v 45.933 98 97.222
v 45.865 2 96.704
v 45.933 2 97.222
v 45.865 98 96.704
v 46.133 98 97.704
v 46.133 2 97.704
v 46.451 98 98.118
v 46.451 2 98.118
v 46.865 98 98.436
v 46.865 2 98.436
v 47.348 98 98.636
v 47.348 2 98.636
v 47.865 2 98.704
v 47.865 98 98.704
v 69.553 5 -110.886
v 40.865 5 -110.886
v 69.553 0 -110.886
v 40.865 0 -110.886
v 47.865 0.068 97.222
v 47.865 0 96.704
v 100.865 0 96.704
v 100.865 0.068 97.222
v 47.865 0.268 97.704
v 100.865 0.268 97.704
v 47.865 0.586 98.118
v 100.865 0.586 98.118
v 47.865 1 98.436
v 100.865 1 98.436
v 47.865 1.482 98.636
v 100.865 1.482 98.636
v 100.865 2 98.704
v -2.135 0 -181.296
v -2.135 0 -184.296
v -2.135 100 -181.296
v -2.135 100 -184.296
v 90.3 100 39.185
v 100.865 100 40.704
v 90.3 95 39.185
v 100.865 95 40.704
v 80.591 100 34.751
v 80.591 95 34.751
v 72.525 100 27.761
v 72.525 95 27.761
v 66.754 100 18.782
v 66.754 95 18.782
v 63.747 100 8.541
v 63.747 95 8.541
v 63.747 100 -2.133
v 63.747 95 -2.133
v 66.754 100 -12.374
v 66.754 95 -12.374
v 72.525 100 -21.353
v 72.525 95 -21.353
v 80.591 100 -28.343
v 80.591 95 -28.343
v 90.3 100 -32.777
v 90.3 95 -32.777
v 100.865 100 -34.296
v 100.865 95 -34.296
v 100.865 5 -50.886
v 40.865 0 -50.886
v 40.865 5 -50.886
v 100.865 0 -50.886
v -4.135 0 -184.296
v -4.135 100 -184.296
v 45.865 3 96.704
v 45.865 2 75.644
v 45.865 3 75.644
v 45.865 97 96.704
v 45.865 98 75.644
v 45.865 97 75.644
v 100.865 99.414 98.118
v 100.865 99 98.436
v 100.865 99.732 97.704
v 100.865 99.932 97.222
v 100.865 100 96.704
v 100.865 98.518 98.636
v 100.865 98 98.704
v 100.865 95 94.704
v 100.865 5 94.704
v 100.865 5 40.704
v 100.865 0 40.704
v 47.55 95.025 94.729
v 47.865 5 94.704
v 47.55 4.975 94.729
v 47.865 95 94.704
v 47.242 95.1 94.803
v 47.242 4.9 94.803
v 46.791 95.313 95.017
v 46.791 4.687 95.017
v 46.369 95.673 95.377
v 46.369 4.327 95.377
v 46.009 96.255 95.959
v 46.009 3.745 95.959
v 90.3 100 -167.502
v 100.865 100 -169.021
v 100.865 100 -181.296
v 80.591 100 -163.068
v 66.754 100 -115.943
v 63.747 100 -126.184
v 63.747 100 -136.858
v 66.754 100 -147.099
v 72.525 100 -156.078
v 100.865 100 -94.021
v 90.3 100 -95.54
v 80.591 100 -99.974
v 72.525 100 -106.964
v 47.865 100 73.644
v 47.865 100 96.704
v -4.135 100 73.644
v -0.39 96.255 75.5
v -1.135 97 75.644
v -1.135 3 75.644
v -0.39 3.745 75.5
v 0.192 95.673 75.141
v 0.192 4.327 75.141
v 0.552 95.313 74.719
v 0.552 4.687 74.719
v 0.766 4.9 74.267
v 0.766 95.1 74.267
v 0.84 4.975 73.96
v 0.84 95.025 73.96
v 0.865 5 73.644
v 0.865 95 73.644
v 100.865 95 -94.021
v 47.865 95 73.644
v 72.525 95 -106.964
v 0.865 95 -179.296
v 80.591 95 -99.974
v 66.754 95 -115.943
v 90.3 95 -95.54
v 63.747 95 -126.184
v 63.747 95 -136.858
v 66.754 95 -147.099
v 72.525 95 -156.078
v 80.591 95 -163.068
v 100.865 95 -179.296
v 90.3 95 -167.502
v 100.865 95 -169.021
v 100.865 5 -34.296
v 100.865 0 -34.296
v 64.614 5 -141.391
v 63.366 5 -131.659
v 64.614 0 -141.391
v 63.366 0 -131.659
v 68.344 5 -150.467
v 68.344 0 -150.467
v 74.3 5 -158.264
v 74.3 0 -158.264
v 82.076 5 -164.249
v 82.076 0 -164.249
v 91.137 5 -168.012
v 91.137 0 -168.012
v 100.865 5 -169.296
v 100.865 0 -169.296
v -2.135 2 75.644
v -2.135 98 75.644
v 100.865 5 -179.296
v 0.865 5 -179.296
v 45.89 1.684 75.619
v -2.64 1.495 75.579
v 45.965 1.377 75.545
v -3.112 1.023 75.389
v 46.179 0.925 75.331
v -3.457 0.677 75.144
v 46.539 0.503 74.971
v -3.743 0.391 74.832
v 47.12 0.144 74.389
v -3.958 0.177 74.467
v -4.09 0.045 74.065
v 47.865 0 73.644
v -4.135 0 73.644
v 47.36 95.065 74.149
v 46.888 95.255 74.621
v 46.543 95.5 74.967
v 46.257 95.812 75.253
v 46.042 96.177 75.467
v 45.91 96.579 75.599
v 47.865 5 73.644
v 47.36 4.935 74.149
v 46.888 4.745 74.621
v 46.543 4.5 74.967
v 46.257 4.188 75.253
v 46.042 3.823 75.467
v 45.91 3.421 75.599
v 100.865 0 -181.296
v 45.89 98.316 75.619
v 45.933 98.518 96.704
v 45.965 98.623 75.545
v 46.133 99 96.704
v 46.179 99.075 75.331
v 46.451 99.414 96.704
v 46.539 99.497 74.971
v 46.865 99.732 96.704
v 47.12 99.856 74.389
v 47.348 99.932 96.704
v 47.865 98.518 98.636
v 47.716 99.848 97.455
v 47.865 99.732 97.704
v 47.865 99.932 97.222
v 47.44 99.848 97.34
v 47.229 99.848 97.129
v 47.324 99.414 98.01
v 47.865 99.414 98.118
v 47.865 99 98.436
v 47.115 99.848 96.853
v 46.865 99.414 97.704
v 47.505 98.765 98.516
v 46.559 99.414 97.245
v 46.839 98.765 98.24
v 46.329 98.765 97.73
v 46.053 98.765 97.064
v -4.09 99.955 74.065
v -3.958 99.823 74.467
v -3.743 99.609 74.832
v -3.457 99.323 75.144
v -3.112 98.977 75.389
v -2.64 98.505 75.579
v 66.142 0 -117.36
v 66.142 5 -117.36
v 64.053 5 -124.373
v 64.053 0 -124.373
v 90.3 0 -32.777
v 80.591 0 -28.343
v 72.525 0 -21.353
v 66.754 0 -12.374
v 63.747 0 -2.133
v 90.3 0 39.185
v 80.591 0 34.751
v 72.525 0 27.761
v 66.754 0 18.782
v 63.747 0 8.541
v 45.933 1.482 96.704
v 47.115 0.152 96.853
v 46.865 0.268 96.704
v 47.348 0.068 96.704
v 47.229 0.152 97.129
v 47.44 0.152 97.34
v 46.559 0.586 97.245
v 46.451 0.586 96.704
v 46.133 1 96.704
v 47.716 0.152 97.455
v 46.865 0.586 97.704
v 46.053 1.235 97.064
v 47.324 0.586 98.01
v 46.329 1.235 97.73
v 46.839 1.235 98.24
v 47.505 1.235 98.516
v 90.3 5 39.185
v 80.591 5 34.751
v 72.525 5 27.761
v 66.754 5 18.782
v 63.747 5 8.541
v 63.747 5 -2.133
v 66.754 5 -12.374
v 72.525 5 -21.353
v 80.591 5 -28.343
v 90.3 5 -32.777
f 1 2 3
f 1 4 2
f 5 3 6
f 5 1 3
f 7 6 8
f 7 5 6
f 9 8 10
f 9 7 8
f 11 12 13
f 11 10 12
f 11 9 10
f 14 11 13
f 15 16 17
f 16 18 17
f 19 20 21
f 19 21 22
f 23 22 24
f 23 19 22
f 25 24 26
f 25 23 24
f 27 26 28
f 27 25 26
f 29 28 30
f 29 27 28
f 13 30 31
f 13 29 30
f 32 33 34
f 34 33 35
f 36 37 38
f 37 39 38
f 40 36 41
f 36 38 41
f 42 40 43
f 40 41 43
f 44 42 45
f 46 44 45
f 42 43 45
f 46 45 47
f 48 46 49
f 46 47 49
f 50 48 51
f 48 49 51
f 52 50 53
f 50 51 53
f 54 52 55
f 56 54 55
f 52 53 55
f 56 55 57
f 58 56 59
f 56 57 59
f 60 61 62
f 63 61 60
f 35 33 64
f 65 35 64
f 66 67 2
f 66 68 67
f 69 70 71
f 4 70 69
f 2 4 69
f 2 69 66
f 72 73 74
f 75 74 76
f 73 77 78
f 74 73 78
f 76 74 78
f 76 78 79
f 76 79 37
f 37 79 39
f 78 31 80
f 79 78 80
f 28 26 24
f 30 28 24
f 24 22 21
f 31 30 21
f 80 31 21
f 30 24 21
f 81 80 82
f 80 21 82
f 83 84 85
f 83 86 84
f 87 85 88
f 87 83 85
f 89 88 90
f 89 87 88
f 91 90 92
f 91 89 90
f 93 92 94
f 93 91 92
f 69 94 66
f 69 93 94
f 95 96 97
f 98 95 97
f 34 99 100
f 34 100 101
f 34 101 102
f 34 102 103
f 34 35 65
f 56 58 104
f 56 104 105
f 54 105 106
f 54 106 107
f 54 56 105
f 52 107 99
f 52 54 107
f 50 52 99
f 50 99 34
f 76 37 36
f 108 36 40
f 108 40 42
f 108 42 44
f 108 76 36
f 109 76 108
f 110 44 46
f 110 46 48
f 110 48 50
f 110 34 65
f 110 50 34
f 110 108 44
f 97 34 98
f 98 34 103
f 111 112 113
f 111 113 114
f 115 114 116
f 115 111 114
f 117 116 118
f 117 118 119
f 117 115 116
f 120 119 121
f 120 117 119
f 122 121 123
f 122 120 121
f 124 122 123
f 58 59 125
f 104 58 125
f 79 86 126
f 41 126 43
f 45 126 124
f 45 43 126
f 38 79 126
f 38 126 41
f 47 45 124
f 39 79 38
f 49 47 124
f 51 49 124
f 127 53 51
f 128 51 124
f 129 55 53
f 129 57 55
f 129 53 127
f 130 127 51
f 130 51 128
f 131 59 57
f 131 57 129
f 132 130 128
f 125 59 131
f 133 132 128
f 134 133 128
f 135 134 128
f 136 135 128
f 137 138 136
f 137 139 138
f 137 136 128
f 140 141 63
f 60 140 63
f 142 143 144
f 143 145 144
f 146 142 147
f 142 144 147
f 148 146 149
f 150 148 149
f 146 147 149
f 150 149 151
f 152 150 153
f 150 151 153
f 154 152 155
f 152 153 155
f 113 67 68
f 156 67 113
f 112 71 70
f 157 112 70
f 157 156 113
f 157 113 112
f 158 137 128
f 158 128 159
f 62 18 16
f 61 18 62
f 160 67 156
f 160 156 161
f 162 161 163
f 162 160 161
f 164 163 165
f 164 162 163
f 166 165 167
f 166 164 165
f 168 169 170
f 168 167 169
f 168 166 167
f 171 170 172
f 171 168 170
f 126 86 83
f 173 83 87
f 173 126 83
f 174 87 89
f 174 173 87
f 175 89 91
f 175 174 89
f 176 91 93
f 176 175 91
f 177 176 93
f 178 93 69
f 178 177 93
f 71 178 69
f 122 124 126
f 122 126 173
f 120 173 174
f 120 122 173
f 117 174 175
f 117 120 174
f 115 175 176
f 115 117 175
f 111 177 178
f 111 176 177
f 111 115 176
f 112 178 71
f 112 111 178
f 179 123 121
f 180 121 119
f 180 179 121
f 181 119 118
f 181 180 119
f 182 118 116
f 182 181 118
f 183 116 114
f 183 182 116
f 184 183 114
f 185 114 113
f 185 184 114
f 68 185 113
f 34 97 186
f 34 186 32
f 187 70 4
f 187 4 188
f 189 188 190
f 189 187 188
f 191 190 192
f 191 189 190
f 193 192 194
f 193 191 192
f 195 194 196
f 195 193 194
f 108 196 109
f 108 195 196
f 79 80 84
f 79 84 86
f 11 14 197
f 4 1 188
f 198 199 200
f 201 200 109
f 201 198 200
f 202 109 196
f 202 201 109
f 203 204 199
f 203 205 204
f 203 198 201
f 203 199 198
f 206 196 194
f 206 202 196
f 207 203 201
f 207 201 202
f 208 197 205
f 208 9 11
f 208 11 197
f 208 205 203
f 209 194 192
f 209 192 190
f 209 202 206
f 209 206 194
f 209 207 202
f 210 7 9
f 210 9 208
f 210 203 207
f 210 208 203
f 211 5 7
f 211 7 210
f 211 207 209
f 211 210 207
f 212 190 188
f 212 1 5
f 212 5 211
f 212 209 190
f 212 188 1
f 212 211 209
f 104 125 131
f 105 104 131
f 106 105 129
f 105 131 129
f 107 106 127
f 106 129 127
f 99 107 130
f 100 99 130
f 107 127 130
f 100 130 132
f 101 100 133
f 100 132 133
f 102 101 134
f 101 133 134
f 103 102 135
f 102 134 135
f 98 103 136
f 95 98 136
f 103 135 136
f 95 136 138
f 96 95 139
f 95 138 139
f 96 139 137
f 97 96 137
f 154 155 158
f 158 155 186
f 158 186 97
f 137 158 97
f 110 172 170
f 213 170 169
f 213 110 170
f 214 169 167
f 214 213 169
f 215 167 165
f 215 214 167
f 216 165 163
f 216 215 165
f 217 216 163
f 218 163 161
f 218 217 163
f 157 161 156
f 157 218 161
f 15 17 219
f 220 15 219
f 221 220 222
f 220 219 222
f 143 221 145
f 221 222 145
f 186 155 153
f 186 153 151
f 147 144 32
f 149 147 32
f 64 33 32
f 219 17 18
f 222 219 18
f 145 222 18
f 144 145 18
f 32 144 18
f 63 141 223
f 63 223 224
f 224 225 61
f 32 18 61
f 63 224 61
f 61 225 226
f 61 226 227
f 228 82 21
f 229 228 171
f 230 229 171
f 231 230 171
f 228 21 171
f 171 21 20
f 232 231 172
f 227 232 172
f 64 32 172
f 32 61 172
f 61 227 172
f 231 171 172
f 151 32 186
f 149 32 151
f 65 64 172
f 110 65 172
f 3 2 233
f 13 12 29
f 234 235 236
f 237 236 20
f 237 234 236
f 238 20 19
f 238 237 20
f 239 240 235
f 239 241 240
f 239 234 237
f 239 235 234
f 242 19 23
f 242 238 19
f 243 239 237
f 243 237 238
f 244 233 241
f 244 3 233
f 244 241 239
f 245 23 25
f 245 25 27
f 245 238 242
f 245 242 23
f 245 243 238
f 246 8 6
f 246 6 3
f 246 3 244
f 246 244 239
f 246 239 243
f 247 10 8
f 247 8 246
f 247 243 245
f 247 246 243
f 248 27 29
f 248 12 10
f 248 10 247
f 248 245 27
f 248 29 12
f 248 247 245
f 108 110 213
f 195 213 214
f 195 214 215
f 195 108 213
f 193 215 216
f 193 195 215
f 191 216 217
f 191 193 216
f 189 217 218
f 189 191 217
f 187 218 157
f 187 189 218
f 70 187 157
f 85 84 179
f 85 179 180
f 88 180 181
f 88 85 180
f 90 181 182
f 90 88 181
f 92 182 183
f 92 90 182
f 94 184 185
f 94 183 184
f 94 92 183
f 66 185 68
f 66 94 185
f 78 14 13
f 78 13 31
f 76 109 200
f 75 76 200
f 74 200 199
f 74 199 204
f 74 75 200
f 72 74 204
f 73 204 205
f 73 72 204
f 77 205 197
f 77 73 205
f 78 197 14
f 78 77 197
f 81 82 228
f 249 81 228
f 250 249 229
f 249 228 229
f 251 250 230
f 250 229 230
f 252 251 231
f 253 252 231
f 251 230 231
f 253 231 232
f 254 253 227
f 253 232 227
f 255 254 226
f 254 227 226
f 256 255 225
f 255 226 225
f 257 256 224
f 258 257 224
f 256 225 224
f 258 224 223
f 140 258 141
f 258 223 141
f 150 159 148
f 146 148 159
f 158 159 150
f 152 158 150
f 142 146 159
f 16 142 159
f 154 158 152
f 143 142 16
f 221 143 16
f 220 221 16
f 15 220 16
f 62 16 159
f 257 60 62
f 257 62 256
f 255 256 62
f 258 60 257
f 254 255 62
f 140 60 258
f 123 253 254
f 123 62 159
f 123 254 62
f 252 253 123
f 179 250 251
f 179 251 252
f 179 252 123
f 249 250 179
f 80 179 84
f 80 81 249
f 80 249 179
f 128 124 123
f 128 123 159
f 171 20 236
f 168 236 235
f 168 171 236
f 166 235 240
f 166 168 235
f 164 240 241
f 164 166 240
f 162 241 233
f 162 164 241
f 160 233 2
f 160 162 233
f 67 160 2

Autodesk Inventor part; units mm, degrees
ref_plane "YZ Plane" through (0, 0, 0) normal (1, 0, 0) x (0, 1, 0)
ref_plane "XZ Plane" through (0, 0, 0) normal (0, 1, 0) x (-1, 0, 0)
ref_plane "XY Plane" through (0, 0, 0) normal (0, 0, 1) x (1, 0, 0)
sketch "스케치1" plane through (0, 0, 0) normal (0, 1, 0) x (-1, 0, 0)
  line L0 (4.1347, 105.7038) -> (-100.8653, 105.7038)
  line L1 (-100.8653, 105.7038) -> (-100.8653, -184.2962)
  line L2 (-100.8653, -184.2962) -> (4.1347, -184.2962)
  line L3 (4.1347, -184.2962) -> (4.1347, 105.7038)
  point P0 (0, 0)
  dimension "d0" = 105
  dimension "d1" = 290
sketch "스케치2" plane through (0, 0, 0) normal (0, 1, 0) x (-1, 0, 0)
  point P0 (0, 0)
sketch "스케치3" plane through (0, 0, 0) normal (0, 1, 0) x (-1, 0, 0)
  point P0 (0, 0)
sketch "스케치4" plane through (0, 0, 0) normal (0, 1, 0) x (-1, 0, 0)
  point P0 (0, 0)
extrude "돌출1" add sketch "스케치1" along normal blind 100
sketch "스케치5" plane through (100.8653, 0, 105.7038) normal (1, 0, 0) x (0, 0, -1)
  line L0 (0, 0) -> (290, 0) projected
  line L1 (290, 0) -> (285, 0)
  line L2 (285, 0) -> (285, 5)
  line L3 (285, 5) -> (290, 5)
  line L4 (290, 5) -> (290, 0)
  line L5 (290, 0) -> (290, 100) projected
  line L6 (290, 100) -> (285, 100)
  line L7 (285, 100) -> (285, 95)
  line L8 (285, 95) -> (290, 95)
  line L9 (290, 95) -> (290, 100)
  line L10 (285, 5) -> (35, 5)
  line L11 (35, 5) -> (35, 95)
  line L12 (35, 95) -> (285, 95)
  line L13 (285, 95) -> (285, 5)
  point P0 (105.7038, 0)
  dimension "d4" = 5
  dimension "d5" = 5
  dimension "d6" = 5
  dimension "d7" = 5
  dimension "d8" = 250
  dimension "d9" = 90
extrude "돌출2" cut sketch "스케치5" against normal blind 100 contours L10 L11 L12 L13
sketch "스케치6" plane through (100.8653, 0, 105.7038) normal (1, 0, 0) x (0, 0, -1)
  point P0 (105.7038, 0)
sketch "스케치7" plane through (100.8653, 0, 105.7038) normal (1, 0, 0) x (0, 0, -1)
  line L0 (285, 5) -> (35, 5) projected
  line L1 (35, 5) -> (11, 5)
  line L2 (11, 5) -> (11, 95)
  line L3 (11, 95) -> (35, 95)
  line L4 (35, 95) -> (35, 5)
  point P0 (105.7038, 0)
  dimension "d12" = 24
extrude "돌출3" cut sketch "스케치7" against normal blind 100
sketch "스케치8" plane through (-4.1347, 0, 105.7038) normal (0, 0, 1) x (1, 0, 0)
  circle A0 centre (22.6105, 17.0226) radius 10.2543
  point P0 (4.1347, 0)
sketch "스케치11" plane through (-4.1347, 0, -184.2962) normal (-1, 0, 0) x (0, 0, 1)
  point P0 (184.2962, 0)
sketch "스케치9" plane through (-4.1347, 0, -184.2962) normal (-1, 0, 0) x (0, 0, 1)
  line L0 (290, 100) -> (0, 100) projected
  line L1 (0, 100) -> (5, 100)
  line L2 (5, 100) -> (5, 95)
  line L3 (5, 95) -> (0, 95)
  line L4 (0, 95) -> (0, 100)
  line L5 (0, 0) -> (5, 0)
  line L6 (0, 0) -> (290, 0) projected
  line L7 (5, 0) -> (75, 0)
  line L8 (5, 0) -> (75, 0) construction
  line L9 (75, 0) -> (140, 0)
  line L10 (75, 0) -> (184.2962, 0)
  dimension "d15" = 5
  dimension "d16" = 5
  dimension "d17" = 5
  dimension "d18" = 70
  dimension "d19" = 0
  dimension "d20" = 65
sketch "스케치12" plane through (-4.1347, 0, -184.2962) normal (-1, 0, 0) x (0, 0, 1)
  point P0 (184.2962, 0)
sketch "스케치10" plane through (0, 0, 0) normal (0, -1, 0) x (1, 0, 0)
  point P0 (0, 0)
sketch "스케치13" plane through (-4.1347, 0, -184.2962) normal (-1, 0, 0) x (0, 0, 1)
  point P0 (184.2962, 0)
sketch "스케치14" plane through (0, 0, 0) normal (0, -1, 0) x (1, 0, 0)
  line L0 (-4.1347, -184.2962) -> (-4.1347, 105.7038) projected
  line L1 (-4.1347, -110.8863) -> (100.8653, -110.8863)
  line L2 (100.8653, 105.7038) -> (100.8653, -184.2962) projected
  line L3 (100.8653, -110.8863) -> (40.8653, -110.8863)
  line L4 (40.8653, -110.8863) -> (40.8653, -50.8863)
  line L5 (40.8653, -50.8863) -> (100.8653, -50.8863)
  line L6 (100.8653, -50.8863) -> (100.8653, -110.8863)
  point P0 (0, 0)
  dimension "d21" = 60
  dimension "d22" = 60
extrude "돌출4" cut sketch "스케치14" against normal blind 80
sketch "스케치15" plane through (0, 0, 0) normal (0, -1, 0) x (1, 0, 0)
  line L0 (100.8653, -184.2962) -> (-4.1347, -184.2962) projected
  line L1 (100.8653, -184.2962) -> (100.8653, -169.2962)
  line L2 (100.8653, -110.8863) -> (100.8653, -184.2962) projected
  line L3 (100.8653, -169.2962) -> (100.8653, -131.7962)
  circle A0 centre (100.8653, -131.7962) radius 37.5
  point P0 (0, 0)
  dimension "d25" = 15
  dimension "d26" = 37.5
  dimension "d27" = 75
extrude "돌출5" cut sketch "스케치15" against normal blind 80
sketch "스케치16" plane through (0, 0, 0) normal (0, -1, 0) x (1, 0, 0)
  arc A0 (69.7361, -110.8863) -> (100.8653, -169.2962) centre (100.8653, -131.7962) ccw projected
  line L0 (100.8653, -169.2962) -> (100.8653, -94.2962)
  line L1 (100.8653, 94.7038) -> (100.8653, -179.2962) projected
  line L2 (100.8653, -169.2962) -> (175.8653, -169.2962) construction
  line L3 (100.8653, -94.2962) -> (100.8653, -34.2962)
  line L4 (100.8653, -34.2962) -> (100.8653, 3.2038)
  circle A1 centre (100.8653, 3.2038) radius 37.5
  point P0 (0, 0)
  point P1 (100.8653, 40.7038)
  dimension "d30" = 75
  dimension "d31" = 90
  dimension "d32" = 60
  dimension "d33" = 37.5
  dimension "d34" = 180
  dimension "d35" = 75
extrude "돌출6" cut sketch "스케치16" against normal blind 8300 contours L1 A1 picked at (87.6481, -17.8312)
sketch "스케치17" plane through (0, 0, 0) normal (0, -1, 0) x (1, 0, 0)
  line L0 (100.8653, -34.2962) -> (100.8653, -184.2962) projected
  line L1 (100.8653, -184.2962) -> (100.8653, -169.0212)
  line L2 (100.8653, -169.0212) -> (100.8653, -131.5212)
  circle A0 centre (100.8653, -131.5212) radius 37.5
  point P0 (0, 0)
  point P1 (100.8653, -94.0212)
  dimension "d38" = 15.275
  dimension "d39" = 37.5
  dimension "d40" = 75
extrude "돌출7" cut sketch "스케치17" against normal blind 8300 contours L0 A0 picked at (87.6481, -152.5562)
sketch "스케치18" plane through (-4.1347, 0, -184.2962) normal (-1, 0, 0) x (0, 0, 1)
  line L0 (0, 0) -> (0, 100) projected
  line L1 (0, 50) -> (260, 50)
  line L2 (0, 50) -> (260, 50) construction
  point P0 (184.2962, 0)
  dimension "d43" = 260
  dimension "d44" = 0
sketch "스케치19" plane through (-4.1347, 0, -184.2962) normal (-1, 0, 0) x (0, 0, 1)
  line L0 (259.9404, 50.2138) -> (259.9404, 99.3471)
  line L1 (259.9404, 99.3471) -> (259.9404, 100)
  line L2 (290, 100) -> (225, 100) projected
  line L3 (290, 0) -> (225, 0) projected
  line L4 (259.9404, 100) -> (290, 100)
  line L5 (290, 100) -> (290, 0)
  line L6 (290, 0) -> (259.9404, 0)
  line L7 (259.9404, 0) -> (259.9404, 100)
  point P0 (184.2962, 0)
extrude "돌출8" cut sketch "스케치19" against normal blind 50
sketch "스케치24" plane through (100.8653, 0, -184.2962) normal (0, 0, -1) x (-1, 0, 0)
  line L0 (0, 0) -> (0, 5) projected
  line L1 (103, 100) -> (0, 100)
  line L2 (0, 100) -> (0, 0)
  line L3 (0, 0) -> (103, 0)
  line L4 (103, 0) -> (103, 100)
  point P0 (100.8653, 0)
extrude "돌출12" cut sketch "스케치24" against normal blind 3
sketch "스케치26" plane through (100.8653, 0, 105.7038) normal (0, 0, 1) x (1, 0, 0)
  line L0 (-55, 100) -> (0, 100) projected
  line L1 (0, 5) -> (0, 0) projected
  line L2 (-55, 100) -> (0, 100)
  line L3 (0, 100) -> (0, 0)
  line L4 (0, 0) -> (-55, 0)
  line L5 (-55, 0) -> (-55, 100)
  point P0 (-100.8653, 0)
extrude "돌출14" cut sketch "스케치26" against normal blind 7
fillet "모깎기7" radius 2 14 edges at (45.8653, 50, 98.7038) (73.3653, 100, 98.7038) (73.3653, 0, 98.7038) (45.8653, 50, 94.7038) (45.8653, 5, 85.1739) (23.3653, 5, 75.6441) (0.8653, 50, 75.6441) (-4.1347, 50, 75.6441) (23.3653, 95, 75.6441) (20.8653, 100, 75.6441) (20.8653, 0, 75.6441) (45.8653, 95, 85.1739) (45.8653, 100, 87.1739) (45.8653, 0, 87.1739)
sketch "스케치20" plane through (-4.1347, 98, -184.2962) normal (-1, 0, 0) x (0, 0, 1)
  line L0 (99.3624, -73.1284) -> (157.5725, -73.1284)
  line L1 (157.5725, -73.1284) -> (157.5725, -19.1517)
  line L2 (157.5725, -19.1517) -> (99.3624, -19.1517)
  line L3 (99.3624, -19.1517) -> (99.3624, -73.1284)
  point P0 (184.2962, -98)
sketch "스케치21" plane through (-14.1347, 98, -184.2962) normal (-1, 0, 0) x (0, 0, 1)
  line L0 (87.1912, -87.9455) -> (166.5686, -87.9455)
  line L1 (166.5686, -87.9455) -> (166.5686, -6.4514)
  line L2 (166.5686, -6.4514) -> (87.1912, -6.4514)
  line L3 (87.1912, -6.4514) -> (87.1912, -87.9455)
  line L4 (87.1912, -87.9455) -> (166.5686, -6.4514) construction
  line L5 (166.5686, -87.9455) -> (87.1912, -6.4514) construction
  point P0 (184.2962, -98)
  point P1 (126.8799, -47.1984)
sketch "스케치22" plane through (-24.1347, 98, -184.2962) normal (-1, 0, 0) x (0, 0, 1)
  line L0 (162.3351, -80.537) -> (95.6581, -80.537)
  line L1 (95.6581, -80.537) -> (95.6581, -12.8016)
  line L2 (95.6581, -12.8016) -> (162.3351, -12.8016)
  line L3 (162.3351, -12.8016) -> (162.3351, -80.537)
  line L4 (162.3351, -80.537) -> (95.6581, -12.8016) construction
  line L5 (95.6581, -80.537) -> (162.3351, -12.8016) construction
  point P0 (184.2962, -98)
  point P1 (128.9966, -46.6693)
properties part number "차체 뚜껑"
